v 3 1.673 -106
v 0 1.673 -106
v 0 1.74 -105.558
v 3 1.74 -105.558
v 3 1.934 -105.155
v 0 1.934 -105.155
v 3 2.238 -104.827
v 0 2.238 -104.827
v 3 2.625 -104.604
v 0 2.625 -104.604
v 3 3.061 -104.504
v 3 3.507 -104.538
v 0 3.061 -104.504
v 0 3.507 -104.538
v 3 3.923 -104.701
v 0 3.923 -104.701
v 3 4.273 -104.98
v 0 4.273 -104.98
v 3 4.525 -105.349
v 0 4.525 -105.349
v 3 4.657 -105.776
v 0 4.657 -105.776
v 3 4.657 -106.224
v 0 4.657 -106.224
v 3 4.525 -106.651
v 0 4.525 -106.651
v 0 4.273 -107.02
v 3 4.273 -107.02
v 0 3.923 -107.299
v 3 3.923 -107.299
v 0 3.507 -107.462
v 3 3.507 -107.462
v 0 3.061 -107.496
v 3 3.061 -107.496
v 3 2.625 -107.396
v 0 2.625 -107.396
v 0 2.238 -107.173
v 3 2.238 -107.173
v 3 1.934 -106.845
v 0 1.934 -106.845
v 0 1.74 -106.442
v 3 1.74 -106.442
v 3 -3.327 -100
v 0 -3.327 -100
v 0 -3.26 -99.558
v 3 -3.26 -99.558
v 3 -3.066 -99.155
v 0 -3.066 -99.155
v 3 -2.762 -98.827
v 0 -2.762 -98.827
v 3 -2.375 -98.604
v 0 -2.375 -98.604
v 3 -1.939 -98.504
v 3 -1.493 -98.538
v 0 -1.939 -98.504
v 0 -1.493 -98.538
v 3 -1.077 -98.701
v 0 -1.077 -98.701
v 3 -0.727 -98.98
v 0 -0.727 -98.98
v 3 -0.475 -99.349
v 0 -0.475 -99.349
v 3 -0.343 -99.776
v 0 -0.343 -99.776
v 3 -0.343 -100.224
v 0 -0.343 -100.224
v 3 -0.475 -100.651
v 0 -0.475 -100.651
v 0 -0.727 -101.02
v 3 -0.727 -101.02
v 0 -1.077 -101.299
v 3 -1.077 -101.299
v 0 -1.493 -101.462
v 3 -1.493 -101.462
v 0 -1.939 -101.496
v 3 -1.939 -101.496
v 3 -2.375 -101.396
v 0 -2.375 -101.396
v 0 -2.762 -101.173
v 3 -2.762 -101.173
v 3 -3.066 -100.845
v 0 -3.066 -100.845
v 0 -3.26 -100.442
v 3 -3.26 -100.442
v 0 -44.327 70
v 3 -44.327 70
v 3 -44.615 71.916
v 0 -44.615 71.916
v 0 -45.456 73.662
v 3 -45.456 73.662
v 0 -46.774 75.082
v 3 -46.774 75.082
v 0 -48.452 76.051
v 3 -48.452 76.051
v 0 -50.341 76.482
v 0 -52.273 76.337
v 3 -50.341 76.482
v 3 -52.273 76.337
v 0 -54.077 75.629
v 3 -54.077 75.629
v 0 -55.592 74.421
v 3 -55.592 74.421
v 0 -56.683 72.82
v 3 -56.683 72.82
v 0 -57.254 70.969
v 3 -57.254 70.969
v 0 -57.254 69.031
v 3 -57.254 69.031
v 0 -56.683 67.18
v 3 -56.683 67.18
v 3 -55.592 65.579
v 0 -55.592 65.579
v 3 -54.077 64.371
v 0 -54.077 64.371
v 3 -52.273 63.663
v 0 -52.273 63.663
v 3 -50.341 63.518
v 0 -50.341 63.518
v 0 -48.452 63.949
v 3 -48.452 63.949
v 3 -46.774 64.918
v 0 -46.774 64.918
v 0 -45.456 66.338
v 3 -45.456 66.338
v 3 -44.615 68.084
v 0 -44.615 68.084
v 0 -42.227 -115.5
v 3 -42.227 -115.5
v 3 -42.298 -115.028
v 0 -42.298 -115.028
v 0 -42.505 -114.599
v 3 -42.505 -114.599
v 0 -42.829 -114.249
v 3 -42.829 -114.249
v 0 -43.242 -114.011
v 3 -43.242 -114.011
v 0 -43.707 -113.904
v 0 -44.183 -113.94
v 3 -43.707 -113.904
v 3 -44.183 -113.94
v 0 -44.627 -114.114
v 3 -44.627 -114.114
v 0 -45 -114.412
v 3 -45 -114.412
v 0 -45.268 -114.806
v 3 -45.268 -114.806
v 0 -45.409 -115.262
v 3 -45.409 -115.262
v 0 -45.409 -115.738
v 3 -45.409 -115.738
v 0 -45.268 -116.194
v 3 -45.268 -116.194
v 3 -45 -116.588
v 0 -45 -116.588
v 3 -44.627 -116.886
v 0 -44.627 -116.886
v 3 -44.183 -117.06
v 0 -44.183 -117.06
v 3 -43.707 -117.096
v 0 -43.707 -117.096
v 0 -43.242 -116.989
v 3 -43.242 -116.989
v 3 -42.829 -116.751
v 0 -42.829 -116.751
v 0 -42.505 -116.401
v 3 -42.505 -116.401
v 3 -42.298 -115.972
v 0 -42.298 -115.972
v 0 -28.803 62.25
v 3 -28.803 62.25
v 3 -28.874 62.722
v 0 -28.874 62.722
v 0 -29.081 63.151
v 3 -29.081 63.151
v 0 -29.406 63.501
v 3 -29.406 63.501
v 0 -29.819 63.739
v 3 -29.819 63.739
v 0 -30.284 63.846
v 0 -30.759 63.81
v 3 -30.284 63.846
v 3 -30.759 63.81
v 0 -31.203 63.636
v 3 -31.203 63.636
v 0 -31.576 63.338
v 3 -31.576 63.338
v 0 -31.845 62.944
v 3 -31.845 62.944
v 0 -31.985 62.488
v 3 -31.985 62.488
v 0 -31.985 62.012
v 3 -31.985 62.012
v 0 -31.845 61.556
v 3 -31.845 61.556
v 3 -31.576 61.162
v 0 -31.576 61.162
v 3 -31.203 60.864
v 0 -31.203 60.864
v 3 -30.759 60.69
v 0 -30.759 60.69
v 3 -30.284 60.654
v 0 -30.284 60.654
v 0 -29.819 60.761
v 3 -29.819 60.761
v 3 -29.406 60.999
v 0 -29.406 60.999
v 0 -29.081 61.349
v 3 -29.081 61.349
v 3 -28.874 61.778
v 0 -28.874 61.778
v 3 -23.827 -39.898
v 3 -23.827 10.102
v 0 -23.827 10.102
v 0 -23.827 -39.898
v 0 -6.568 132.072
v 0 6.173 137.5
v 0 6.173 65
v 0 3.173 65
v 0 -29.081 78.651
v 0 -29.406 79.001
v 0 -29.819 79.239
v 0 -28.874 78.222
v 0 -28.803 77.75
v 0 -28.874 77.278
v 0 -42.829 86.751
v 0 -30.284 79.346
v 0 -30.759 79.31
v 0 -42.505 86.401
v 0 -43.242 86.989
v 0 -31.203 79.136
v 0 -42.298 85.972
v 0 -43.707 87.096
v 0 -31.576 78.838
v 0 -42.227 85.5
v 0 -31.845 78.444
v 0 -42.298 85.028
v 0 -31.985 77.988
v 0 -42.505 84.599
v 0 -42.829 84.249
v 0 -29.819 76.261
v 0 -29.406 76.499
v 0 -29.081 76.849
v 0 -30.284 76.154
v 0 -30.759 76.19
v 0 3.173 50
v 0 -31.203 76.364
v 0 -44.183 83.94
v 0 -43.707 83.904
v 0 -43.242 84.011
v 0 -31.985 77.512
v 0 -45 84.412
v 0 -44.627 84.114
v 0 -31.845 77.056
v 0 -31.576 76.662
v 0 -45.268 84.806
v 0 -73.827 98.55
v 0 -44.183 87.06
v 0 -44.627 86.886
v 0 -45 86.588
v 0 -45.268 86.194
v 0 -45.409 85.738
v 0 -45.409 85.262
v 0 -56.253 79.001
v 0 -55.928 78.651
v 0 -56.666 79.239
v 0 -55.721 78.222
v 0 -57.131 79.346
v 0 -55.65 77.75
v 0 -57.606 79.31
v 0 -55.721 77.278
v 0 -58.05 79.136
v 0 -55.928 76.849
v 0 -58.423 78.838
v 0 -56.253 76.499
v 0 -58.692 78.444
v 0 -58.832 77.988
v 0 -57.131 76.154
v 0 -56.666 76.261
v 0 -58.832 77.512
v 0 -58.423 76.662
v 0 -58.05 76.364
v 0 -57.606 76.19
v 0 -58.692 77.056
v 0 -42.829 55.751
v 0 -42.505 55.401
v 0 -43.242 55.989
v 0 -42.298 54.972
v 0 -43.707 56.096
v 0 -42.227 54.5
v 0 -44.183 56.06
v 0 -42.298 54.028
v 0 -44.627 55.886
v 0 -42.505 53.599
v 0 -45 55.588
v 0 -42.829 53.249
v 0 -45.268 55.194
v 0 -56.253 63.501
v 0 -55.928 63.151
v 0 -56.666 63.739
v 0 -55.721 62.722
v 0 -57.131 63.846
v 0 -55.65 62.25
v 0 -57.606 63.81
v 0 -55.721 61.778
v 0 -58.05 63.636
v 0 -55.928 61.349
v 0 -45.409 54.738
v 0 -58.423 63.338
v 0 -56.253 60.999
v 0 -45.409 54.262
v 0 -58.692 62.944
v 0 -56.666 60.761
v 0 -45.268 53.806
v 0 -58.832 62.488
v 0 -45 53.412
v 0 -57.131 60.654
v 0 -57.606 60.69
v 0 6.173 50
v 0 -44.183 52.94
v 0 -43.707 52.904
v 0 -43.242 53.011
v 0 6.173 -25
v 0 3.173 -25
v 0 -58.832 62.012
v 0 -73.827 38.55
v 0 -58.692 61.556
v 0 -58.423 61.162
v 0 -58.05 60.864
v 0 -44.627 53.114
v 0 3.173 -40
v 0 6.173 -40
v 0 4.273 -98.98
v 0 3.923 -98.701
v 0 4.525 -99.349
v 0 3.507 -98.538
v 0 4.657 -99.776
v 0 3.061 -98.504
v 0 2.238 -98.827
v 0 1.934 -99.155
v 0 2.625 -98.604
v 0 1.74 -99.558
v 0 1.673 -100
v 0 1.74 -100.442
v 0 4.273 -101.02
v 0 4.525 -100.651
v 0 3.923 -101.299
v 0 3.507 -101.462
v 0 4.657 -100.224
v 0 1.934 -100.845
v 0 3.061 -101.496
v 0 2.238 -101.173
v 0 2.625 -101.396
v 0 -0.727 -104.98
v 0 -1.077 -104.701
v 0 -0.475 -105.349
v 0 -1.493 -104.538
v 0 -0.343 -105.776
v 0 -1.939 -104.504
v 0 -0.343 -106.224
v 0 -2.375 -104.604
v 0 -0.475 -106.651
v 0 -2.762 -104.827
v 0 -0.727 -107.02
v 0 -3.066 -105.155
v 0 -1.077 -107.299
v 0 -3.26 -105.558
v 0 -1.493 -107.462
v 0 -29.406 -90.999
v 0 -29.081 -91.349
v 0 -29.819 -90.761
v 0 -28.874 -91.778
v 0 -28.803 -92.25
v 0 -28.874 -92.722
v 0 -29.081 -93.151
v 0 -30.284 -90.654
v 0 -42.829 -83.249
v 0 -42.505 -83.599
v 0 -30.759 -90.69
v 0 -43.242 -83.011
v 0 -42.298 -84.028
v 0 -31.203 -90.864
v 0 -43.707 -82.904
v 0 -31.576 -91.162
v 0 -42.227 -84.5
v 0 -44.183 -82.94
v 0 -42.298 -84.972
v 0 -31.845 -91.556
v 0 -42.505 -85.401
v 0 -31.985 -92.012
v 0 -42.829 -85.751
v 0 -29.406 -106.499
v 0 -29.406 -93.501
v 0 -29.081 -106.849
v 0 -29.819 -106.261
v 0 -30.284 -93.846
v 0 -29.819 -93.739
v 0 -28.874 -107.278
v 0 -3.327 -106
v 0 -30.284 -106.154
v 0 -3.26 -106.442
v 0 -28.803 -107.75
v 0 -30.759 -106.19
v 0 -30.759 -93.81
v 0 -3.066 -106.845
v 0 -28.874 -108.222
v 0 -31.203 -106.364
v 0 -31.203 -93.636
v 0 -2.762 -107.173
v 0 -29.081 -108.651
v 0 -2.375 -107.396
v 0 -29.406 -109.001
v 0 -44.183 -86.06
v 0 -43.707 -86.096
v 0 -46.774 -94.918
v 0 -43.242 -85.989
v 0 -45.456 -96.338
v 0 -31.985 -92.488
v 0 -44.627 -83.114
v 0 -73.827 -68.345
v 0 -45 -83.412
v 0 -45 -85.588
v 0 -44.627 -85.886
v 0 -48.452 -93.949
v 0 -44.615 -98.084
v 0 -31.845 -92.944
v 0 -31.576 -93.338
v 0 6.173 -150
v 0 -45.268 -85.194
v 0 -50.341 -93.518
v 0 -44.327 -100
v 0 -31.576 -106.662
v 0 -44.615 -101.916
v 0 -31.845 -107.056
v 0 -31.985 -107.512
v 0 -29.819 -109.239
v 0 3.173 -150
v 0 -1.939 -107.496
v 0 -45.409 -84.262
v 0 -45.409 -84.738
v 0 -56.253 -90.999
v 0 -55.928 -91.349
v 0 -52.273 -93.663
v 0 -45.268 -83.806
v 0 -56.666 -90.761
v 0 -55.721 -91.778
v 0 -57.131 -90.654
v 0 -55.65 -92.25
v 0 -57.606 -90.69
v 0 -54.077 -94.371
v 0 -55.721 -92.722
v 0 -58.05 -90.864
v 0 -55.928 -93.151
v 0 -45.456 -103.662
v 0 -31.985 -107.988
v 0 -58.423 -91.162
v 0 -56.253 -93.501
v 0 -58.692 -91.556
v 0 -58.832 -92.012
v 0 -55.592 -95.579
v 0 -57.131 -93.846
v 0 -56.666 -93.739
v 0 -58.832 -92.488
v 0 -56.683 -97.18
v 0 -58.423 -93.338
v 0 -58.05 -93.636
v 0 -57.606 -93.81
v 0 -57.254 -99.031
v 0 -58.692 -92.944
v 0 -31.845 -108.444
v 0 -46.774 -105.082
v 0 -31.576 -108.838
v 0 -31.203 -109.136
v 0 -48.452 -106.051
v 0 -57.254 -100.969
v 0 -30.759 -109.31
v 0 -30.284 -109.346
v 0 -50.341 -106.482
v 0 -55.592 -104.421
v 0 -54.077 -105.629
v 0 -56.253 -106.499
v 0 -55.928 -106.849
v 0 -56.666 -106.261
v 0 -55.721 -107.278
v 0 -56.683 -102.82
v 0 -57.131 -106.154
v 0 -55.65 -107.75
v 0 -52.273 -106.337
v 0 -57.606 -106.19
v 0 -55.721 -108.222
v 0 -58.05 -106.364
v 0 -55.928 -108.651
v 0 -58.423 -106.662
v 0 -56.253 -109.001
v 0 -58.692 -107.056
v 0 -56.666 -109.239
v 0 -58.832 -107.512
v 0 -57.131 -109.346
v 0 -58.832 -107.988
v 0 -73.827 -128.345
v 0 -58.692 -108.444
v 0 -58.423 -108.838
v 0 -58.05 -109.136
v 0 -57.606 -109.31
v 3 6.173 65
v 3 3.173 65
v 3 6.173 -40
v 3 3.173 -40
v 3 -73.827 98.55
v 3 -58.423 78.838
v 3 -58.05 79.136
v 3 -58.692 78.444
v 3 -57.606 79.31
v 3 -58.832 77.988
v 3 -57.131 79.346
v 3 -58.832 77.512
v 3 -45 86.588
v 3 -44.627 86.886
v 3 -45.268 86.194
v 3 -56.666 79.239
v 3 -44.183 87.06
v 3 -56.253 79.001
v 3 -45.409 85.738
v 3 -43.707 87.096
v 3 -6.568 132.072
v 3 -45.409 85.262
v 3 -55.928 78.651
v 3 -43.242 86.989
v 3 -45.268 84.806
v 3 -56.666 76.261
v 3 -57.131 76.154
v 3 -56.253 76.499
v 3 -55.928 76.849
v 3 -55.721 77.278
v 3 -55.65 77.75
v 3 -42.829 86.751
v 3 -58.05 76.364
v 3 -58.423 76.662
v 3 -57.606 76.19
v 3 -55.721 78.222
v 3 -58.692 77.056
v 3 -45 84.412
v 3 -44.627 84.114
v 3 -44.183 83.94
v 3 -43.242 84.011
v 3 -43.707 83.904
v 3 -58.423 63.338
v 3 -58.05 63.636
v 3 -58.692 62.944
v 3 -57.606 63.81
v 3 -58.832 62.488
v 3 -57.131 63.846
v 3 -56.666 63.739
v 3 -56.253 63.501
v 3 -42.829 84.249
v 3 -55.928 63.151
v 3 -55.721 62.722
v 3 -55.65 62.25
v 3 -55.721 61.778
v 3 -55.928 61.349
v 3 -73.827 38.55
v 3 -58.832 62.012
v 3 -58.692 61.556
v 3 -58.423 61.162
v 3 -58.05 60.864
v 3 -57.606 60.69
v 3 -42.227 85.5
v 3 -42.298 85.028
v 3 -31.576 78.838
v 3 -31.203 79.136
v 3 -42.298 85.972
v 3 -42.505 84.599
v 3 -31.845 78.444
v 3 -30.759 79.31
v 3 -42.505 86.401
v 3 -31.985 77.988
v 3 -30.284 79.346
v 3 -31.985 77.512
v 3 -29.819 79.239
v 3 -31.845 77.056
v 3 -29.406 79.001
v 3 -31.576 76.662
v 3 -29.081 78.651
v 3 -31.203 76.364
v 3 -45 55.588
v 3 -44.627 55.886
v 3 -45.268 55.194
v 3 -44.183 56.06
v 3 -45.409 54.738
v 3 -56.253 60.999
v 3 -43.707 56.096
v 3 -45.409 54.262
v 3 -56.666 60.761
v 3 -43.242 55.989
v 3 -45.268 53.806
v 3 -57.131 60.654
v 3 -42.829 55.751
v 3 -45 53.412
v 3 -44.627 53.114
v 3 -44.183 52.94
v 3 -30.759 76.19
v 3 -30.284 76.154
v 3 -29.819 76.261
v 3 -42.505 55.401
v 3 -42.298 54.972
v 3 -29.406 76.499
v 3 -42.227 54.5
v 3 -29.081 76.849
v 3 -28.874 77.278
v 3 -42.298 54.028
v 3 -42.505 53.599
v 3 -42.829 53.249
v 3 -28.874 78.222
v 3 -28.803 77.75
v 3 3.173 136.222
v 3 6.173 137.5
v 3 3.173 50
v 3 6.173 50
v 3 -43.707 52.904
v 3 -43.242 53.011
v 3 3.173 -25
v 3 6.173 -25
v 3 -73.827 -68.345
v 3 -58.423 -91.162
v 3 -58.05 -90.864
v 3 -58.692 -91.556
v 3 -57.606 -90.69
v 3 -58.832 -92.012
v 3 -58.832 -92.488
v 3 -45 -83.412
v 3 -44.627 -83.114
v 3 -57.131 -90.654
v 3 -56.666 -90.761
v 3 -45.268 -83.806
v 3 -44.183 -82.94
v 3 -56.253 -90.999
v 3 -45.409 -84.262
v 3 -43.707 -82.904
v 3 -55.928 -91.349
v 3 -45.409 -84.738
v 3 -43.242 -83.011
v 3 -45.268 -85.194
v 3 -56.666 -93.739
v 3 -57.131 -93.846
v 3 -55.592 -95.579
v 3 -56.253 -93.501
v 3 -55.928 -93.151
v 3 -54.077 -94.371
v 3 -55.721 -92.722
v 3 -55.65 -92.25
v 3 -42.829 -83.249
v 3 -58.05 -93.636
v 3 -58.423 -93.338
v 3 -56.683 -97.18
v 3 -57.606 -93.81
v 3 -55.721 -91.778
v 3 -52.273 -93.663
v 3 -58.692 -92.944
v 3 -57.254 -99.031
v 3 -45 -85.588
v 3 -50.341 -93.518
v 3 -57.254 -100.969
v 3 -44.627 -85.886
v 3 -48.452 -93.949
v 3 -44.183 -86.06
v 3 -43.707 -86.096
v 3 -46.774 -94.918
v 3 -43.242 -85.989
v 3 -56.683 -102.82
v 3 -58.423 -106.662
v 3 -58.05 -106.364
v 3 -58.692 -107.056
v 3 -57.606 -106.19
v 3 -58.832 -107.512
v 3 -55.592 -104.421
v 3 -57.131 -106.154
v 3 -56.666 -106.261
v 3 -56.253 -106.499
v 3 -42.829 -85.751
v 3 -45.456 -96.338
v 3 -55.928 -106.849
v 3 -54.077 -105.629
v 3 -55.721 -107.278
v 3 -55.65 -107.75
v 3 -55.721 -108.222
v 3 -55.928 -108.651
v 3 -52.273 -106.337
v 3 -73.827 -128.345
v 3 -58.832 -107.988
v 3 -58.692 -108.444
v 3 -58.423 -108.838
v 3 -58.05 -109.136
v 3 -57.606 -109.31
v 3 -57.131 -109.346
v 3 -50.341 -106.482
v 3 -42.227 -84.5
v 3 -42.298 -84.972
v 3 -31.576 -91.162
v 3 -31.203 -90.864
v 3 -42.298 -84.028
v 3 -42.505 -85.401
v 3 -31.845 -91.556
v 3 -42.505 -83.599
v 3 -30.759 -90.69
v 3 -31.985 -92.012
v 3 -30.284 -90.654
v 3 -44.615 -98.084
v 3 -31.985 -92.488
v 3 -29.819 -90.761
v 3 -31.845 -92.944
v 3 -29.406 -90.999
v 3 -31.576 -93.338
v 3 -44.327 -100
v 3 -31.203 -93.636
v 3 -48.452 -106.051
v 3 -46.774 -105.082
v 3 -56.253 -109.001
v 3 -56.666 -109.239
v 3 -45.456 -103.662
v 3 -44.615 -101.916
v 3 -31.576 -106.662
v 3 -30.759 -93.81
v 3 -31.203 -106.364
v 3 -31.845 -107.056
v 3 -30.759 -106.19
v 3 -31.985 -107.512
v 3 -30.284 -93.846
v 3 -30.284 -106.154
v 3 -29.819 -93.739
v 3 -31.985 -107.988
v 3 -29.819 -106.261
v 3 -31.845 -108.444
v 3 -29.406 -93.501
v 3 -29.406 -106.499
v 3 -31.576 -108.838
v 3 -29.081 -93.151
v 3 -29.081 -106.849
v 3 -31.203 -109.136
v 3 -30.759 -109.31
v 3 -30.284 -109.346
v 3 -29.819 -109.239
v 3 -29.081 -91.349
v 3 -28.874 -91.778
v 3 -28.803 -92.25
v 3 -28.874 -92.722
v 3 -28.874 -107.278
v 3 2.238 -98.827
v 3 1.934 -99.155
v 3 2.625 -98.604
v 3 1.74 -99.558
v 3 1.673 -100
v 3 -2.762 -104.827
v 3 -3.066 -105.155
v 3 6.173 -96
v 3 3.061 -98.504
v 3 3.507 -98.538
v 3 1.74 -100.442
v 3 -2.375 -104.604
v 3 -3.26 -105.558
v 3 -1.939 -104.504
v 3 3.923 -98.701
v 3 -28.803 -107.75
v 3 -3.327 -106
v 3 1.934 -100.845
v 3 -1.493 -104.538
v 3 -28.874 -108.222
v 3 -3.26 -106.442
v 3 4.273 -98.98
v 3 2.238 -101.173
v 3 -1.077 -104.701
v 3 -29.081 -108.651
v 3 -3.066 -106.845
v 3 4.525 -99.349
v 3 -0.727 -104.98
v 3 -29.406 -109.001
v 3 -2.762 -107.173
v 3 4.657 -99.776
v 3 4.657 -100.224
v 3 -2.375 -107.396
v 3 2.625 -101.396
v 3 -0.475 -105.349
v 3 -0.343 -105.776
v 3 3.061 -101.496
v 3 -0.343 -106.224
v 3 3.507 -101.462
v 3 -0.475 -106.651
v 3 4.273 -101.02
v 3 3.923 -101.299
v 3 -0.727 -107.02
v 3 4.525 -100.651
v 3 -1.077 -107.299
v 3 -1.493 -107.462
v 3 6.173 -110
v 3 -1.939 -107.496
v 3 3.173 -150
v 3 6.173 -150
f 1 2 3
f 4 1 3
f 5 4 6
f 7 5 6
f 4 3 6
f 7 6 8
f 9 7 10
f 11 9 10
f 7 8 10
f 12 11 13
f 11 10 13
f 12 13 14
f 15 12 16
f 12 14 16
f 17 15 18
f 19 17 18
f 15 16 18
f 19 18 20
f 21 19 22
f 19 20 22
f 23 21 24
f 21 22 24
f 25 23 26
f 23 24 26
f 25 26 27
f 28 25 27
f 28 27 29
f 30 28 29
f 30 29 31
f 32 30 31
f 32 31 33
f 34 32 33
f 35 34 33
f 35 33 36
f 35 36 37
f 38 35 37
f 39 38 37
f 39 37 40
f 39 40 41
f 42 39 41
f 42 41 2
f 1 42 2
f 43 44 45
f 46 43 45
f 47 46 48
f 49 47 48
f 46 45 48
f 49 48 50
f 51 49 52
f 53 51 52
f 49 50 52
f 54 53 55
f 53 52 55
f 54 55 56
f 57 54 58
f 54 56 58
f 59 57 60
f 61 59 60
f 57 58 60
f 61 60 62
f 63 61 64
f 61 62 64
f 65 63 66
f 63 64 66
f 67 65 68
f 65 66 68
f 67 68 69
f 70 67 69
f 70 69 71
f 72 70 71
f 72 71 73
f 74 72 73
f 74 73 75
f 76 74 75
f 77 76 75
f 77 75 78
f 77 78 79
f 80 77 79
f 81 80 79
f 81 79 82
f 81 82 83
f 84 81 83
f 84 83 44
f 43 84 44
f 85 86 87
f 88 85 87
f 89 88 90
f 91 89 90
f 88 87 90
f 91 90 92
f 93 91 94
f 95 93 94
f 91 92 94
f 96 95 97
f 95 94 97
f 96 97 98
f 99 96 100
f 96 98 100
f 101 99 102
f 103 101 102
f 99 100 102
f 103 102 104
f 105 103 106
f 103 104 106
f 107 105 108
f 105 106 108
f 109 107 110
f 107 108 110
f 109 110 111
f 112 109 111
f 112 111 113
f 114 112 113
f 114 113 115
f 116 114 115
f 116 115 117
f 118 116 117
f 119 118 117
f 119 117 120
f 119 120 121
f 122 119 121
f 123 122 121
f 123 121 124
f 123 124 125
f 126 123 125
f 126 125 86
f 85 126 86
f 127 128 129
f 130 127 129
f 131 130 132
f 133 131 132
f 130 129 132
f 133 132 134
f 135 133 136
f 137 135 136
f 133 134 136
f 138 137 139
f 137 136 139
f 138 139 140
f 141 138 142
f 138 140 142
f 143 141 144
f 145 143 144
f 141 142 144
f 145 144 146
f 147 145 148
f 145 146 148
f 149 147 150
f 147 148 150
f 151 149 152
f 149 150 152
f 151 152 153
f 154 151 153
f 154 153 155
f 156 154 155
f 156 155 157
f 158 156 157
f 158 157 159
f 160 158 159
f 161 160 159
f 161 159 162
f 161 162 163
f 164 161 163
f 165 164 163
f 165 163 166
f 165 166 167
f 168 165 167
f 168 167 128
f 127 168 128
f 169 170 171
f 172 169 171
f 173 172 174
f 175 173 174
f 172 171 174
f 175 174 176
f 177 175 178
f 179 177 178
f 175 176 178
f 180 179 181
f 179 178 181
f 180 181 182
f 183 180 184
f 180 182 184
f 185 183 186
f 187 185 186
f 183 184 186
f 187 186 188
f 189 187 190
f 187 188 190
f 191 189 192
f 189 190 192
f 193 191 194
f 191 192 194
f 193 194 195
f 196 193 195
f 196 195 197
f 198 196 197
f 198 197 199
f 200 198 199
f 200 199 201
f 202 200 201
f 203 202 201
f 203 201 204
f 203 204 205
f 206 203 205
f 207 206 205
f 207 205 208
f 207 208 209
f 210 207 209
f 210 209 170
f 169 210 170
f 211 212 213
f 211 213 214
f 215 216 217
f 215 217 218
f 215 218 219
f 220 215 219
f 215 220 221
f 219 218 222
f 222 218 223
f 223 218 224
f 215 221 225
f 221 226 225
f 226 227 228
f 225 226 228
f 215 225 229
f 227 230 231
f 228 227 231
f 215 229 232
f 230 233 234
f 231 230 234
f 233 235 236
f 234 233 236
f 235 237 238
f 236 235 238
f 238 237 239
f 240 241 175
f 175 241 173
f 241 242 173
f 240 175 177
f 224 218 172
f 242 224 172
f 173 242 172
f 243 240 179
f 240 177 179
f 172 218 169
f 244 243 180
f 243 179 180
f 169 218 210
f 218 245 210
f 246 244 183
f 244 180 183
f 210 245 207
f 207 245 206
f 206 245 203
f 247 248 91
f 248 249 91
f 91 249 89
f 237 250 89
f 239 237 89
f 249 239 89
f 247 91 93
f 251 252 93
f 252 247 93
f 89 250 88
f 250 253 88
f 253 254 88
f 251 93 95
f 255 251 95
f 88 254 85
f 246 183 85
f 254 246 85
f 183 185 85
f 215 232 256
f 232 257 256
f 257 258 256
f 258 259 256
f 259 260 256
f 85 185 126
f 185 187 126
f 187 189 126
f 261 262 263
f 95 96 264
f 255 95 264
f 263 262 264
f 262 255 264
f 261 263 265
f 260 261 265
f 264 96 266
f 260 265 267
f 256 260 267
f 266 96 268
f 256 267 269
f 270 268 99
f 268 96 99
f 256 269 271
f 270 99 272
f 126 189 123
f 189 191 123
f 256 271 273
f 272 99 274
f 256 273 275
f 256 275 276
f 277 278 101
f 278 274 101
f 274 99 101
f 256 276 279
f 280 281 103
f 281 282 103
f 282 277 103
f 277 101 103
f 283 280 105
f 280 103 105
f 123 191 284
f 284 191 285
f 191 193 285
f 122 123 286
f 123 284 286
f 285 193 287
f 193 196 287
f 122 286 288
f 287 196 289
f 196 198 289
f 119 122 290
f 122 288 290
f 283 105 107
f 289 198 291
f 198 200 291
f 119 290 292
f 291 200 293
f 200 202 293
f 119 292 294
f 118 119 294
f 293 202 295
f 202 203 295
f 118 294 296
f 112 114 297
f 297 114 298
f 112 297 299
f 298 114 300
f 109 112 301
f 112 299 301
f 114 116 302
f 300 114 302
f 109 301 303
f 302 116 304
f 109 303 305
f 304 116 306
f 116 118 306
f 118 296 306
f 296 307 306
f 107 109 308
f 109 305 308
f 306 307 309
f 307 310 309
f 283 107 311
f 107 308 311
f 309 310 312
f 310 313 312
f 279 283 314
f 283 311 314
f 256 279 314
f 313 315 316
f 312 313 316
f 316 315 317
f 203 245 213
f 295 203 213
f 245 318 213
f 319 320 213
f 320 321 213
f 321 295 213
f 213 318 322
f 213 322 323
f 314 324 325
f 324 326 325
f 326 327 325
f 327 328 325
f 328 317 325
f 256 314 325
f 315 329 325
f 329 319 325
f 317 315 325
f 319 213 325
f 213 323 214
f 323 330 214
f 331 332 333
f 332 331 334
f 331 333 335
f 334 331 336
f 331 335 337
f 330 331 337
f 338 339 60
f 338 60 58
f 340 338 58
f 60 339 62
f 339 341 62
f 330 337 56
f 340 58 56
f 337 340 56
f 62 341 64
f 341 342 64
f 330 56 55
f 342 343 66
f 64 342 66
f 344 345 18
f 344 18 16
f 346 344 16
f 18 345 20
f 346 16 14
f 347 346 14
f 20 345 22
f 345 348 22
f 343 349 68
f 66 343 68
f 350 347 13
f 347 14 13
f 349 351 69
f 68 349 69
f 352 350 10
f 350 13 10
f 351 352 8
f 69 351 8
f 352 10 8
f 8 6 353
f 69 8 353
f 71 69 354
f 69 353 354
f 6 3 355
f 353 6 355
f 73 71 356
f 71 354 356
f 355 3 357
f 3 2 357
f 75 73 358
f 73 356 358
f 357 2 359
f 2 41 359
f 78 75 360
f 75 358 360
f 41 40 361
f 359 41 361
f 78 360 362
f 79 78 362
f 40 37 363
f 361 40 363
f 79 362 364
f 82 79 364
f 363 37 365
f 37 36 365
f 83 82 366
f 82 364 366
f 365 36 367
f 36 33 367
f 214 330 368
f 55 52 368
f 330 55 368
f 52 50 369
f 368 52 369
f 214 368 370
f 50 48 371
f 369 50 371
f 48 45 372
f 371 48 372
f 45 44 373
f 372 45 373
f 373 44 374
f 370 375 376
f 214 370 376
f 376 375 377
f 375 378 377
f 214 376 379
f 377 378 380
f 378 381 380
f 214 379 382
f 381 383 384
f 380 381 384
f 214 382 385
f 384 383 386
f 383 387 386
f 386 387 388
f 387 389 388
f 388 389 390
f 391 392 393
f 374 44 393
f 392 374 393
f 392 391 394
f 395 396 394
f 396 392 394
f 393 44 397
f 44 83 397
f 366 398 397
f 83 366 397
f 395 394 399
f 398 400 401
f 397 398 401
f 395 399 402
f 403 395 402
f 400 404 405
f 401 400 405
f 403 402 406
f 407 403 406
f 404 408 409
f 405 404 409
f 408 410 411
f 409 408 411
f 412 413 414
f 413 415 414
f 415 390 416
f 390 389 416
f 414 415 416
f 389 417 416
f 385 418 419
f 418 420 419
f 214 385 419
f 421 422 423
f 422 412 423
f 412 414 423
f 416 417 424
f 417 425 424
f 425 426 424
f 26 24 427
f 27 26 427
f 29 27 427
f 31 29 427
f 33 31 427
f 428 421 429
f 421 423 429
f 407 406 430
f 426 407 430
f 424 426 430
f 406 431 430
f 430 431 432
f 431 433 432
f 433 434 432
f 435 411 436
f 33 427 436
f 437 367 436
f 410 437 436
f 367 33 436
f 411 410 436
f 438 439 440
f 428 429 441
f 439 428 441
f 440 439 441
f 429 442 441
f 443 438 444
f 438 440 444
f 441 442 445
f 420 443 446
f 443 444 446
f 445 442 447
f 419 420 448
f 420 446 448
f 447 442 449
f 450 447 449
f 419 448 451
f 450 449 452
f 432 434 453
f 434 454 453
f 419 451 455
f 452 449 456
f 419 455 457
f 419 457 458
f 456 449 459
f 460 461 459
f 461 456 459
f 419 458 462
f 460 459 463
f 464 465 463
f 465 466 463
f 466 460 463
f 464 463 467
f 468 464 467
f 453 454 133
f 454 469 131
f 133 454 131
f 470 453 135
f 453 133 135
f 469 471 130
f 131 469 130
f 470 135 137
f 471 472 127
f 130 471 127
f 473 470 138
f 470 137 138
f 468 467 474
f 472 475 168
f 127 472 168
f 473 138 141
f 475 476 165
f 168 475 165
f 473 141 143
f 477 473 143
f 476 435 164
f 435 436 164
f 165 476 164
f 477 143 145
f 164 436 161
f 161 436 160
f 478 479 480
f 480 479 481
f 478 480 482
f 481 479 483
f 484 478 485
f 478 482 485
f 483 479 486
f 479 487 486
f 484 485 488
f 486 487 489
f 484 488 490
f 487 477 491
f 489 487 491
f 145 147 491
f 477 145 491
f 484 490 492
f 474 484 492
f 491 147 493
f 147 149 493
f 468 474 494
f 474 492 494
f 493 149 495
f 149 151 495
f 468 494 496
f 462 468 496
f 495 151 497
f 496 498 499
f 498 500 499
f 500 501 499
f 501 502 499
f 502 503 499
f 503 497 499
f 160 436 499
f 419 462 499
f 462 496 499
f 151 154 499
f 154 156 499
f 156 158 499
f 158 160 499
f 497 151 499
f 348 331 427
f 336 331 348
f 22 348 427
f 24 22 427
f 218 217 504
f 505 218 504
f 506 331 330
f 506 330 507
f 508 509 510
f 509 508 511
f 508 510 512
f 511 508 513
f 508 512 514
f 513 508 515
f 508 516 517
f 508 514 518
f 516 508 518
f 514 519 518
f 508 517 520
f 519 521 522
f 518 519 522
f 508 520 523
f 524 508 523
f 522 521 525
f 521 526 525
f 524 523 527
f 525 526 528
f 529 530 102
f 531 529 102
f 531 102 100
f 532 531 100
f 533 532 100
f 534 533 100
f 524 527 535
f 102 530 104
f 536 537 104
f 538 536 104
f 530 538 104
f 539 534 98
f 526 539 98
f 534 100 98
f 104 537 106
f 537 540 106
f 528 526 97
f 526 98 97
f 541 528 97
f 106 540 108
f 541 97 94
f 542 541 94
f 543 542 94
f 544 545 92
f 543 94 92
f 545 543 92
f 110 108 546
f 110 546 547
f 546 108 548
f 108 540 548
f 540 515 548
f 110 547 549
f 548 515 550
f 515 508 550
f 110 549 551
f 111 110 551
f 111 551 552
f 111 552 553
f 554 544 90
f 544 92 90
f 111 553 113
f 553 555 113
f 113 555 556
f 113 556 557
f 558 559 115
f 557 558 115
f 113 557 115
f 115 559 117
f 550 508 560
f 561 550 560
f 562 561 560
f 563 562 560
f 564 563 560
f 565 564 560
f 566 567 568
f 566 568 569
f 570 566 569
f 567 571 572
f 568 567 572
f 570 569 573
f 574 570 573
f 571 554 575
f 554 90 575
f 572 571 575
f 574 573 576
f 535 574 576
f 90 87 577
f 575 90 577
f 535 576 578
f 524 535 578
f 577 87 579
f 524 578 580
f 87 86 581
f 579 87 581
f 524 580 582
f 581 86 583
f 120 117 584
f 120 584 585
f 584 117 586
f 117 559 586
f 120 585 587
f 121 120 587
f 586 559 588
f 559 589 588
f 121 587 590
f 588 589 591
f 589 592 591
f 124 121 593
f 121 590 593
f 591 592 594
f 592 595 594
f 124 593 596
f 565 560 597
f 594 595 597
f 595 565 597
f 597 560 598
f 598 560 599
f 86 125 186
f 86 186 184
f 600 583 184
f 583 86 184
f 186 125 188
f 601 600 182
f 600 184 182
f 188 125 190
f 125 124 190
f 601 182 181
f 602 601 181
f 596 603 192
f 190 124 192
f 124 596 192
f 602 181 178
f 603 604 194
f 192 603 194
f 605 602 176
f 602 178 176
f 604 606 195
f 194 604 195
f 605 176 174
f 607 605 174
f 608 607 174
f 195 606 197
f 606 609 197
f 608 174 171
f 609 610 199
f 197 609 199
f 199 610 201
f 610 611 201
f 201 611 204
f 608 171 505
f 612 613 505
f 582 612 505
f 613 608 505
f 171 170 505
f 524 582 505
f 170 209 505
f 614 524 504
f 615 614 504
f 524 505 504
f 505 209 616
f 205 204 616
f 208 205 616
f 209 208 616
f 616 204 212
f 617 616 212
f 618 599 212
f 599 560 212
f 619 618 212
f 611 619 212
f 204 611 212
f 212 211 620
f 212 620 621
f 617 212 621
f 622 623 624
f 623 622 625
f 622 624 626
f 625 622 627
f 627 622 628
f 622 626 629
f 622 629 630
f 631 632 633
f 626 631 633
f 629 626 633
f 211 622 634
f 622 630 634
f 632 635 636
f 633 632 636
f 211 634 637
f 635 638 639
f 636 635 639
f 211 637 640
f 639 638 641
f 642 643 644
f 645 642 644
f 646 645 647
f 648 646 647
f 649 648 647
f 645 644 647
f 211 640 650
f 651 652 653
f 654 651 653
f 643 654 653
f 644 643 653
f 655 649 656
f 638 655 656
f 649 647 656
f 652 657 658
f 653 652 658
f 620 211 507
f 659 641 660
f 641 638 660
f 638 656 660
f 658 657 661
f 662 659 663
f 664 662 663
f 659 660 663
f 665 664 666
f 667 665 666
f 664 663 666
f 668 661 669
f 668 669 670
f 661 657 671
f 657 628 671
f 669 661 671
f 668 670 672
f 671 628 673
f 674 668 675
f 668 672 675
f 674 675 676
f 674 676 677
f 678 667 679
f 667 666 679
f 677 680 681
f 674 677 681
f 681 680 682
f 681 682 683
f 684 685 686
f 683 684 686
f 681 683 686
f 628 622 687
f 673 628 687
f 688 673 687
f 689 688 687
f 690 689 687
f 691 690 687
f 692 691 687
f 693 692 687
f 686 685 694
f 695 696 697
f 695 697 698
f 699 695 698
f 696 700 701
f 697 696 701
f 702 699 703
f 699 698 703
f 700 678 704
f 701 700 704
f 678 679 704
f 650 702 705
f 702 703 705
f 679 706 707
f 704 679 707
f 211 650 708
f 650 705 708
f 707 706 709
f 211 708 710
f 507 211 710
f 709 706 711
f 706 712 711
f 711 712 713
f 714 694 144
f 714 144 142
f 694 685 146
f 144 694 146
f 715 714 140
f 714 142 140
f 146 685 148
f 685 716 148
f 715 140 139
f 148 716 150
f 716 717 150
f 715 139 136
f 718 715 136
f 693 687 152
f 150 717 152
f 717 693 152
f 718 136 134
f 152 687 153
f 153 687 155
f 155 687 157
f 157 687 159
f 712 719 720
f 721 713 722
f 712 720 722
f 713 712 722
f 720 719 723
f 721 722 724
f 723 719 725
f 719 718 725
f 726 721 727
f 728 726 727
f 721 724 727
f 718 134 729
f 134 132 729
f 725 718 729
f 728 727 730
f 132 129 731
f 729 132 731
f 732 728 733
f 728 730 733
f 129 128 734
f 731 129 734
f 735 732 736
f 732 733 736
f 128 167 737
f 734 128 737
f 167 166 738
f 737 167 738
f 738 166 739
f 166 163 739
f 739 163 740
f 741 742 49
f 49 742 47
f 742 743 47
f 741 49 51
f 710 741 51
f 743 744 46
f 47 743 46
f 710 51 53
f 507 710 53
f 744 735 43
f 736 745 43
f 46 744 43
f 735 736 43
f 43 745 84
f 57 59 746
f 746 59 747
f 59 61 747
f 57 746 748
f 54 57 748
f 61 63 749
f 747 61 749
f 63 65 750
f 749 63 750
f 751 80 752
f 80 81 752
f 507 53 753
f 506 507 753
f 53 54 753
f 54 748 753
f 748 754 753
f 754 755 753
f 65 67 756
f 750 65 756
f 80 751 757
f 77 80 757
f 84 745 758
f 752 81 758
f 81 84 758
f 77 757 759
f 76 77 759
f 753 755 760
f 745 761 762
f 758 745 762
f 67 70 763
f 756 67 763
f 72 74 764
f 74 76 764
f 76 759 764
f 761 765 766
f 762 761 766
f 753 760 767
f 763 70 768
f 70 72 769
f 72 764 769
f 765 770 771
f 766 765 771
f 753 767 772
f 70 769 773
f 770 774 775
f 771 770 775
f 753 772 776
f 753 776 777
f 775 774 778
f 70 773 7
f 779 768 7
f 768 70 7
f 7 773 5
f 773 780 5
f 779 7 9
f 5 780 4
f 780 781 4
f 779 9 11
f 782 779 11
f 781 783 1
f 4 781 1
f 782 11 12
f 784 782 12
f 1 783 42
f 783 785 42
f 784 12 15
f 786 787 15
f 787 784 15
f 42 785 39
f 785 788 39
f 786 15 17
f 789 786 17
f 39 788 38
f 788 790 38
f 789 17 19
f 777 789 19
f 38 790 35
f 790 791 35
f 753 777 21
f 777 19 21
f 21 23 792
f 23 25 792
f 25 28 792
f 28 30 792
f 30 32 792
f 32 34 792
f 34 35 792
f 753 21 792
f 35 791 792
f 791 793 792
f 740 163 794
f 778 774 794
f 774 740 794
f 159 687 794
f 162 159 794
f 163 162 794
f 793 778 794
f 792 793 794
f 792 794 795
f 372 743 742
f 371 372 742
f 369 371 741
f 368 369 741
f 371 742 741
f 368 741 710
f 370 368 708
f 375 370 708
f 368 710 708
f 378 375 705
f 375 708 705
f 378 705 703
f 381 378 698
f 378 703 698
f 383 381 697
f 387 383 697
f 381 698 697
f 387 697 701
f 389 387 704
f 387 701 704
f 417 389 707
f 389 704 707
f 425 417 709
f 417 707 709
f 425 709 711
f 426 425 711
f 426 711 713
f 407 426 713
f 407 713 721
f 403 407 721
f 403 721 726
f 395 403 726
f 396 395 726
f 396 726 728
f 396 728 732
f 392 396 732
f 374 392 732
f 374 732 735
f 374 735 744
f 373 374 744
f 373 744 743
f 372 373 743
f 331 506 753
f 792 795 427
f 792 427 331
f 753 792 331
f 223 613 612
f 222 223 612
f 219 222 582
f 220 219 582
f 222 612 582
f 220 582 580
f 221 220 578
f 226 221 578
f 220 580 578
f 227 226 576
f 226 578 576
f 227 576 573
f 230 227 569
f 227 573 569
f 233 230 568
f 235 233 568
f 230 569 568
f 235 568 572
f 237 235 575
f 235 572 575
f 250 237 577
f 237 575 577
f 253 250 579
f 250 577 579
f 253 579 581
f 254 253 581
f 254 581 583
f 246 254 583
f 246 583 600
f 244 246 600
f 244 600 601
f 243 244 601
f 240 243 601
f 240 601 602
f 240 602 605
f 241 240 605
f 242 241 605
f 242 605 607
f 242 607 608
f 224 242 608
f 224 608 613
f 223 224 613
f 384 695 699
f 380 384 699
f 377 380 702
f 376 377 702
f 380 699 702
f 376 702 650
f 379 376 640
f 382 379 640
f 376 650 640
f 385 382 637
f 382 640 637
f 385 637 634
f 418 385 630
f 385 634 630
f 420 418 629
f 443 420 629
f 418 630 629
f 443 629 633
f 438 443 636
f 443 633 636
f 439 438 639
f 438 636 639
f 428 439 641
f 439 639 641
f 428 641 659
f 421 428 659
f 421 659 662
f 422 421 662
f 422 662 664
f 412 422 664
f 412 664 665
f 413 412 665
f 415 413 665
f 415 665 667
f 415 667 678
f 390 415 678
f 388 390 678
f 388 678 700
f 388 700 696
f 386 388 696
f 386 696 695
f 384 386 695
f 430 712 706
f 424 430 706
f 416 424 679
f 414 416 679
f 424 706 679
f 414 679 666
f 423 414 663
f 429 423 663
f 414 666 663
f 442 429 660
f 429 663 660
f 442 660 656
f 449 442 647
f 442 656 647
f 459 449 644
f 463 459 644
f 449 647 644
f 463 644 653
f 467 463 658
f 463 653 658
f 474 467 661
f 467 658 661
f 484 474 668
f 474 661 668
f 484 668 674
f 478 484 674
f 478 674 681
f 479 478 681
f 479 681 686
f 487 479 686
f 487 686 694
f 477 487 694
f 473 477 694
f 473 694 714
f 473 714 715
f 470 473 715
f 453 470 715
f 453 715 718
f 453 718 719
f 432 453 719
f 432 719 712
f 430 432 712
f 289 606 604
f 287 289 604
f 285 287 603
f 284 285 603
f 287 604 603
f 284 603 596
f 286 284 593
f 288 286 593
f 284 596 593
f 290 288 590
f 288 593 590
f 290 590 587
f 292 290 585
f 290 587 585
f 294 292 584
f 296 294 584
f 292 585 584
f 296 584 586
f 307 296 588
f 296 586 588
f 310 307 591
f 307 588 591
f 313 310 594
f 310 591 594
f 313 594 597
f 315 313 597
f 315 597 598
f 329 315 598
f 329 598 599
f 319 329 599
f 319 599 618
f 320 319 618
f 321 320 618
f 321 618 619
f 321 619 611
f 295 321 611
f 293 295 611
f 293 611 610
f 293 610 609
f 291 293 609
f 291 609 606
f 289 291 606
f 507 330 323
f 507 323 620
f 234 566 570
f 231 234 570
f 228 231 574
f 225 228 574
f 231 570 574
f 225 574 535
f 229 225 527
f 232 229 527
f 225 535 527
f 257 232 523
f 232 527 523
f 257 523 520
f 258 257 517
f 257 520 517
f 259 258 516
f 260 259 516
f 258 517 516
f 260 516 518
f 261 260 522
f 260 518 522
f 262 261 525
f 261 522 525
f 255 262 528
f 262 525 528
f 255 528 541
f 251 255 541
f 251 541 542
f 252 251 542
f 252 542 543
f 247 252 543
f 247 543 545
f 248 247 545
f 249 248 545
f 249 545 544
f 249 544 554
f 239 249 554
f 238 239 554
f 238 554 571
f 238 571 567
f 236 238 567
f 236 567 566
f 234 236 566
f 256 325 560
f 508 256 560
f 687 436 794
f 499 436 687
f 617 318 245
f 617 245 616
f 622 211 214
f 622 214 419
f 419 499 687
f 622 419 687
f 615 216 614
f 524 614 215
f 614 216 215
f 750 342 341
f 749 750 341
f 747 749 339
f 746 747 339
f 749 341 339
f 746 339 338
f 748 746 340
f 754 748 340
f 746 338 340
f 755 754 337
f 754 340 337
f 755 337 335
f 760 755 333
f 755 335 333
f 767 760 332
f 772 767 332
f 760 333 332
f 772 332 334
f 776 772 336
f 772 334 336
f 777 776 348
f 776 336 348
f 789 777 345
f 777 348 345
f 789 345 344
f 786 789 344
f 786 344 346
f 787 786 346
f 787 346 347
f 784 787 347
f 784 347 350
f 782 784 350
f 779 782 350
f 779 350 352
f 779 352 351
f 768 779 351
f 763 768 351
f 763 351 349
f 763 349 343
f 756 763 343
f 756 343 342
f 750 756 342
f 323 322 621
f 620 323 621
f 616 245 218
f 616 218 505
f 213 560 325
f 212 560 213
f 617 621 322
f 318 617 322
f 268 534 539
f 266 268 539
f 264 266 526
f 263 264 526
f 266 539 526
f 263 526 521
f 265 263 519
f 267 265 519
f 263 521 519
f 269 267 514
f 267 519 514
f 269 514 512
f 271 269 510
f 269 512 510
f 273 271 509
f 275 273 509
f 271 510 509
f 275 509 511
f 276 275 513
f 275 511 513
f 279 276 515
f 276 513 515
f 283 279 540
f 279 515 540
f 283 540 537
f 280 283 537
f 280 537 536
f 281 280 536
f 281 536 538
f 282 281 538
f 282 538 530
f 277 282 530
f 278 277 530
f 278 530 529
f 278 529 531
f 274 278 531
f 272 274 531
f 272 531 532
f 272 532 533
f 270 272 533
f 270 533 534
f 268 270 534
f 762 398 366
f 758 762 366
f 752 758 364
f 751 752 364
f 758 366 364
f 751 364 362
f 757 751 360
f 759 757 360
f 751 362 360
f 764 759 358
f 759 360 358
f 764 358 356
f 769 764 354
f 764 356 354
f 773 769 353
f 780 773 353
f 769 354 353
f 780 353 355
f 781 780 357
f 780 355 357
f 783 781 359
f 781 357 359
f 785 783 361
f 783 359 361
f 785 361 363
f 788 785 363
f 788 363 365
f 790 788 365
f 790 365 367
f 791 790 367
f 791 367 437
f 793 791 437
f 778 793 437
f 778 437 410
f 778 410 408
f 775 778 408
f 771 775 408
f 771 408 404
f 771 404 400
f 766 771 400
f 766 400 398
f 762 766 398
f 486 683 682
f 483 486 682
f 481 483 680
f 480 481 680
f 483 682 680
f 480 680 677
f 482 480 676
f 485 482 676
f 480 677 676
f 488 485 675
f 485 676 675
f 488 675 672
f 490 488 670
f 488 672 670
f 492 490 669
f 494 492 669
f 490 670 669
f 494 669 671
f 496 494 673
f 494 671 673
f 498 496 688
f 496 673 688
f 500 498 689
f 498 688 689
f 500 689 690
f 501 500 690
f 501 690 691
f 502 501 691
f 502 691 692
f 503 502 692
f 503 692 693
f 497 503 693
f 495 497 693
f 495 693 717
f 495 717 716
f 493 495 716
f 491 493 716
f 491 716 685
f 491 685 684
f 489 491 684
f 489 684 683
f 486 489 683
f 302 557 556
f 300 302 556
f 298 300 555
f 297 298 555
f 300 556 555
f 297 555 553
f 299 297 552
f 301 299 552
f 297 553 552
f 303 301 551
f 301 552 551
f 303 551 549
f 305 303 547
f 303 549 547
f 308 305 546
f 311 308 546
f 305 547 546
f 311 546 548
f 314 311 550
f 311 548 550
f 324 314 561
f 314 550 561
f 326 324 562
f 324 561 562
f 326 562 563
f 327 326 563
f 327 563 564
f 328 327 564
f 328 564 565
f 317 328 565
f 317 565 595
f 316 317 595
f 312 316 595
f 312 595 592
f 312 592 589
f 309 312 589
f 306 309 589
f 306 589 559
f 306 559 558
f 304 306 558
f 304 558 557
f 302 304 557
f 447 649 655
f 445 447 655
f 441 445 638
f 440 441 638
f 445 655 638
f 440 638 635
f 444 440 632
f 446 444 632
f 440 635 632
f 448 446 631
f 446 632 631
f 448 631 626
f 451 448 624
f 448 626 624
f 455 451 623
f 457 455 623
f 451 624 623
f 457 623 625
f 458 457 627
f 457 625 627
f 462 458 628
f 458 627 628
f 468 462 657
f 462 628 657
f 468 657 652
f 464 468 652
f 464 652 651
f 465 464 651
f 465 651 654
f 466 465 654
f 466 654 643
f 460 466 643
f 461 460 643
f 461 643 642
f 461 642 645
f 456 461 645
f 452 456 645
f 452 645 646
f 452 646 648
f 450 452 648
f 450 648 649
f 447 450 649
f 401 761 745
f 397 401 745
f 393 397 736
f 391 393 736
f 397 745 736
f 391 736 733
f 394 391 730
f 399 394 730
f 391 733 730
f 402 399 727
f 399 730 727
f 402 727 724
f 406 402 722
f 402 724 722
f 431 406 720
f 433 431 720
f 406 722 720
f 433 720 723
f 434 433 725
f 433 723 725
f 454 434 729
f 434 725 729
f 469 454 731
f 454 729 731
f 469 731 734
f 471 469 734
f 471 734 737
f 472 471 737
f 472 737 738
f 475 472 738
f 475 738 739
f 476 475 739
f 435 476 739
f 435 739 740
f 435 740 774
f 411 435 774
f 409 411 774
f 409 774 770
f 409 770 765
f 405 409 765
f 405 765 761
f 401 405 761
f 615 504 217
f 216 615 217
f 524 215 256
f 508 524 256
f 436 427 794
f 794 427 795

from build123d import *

# Parameters (mm, degrees)
EXTRUDE_1_DEPTH           = 150
EXTRUDE_1_DEPTH_BACK      = 150
SKETCH_4_R                = 2.5
CUT_EXTRUDE_4_DEPTH       = 3
SKETCH_5_W                = 52
SKETCH_5_H                = 100
CUT_EXTRUDE_5_DEPTH       = 3
SKETCH_7_R                = 1.6
SKETCH_7_R_2              = 6.5
CUT_EXTRUDE_9_DEPTH       = 185.063533313
SKETCH_6_W                = 40
SKETCH_6_H                = 200
CUT_EXTRUDE_10_DEPTH      = 10
CUT_EXTRUDE_12_DEPTH      = 4
SKETCH_12_W               = 34
SKETCH_12_H               = 110
CUT_EXTRUDE_13_DEPTH      = 4
SKETCH_14_W               = 4.2
SKETCH_14_H               = 14
CUT_EXTRUDE_14_DEPTH      = 10
SKETCH_15_R               = 2
CUT_EXTRUDE_15_DEPTH      = 26
SKETCH_17_R               = 1.5
CUT_EXTRUDE_19_DEPTH      = 10
CUT_EXTRUDE_20_DEPTH      = 10
CUT_EXTRUDE_21_DEPTH      = 31
SKETCH_22_R               = 1.5
CUT_EXTRUDE_22_DEPTH      = 31
SKETCH_23_W               = 12
SKETCH_23_H               = 87.5
EXTRUDE_3_DEPTH           = 3
CUT_EXTRUDE_23_DEPTH      = 18
CUT_EXTRUDE_24_DEPTH      = 13
CUT_EXTRUDE_24_DEPTH_BACK = 4
SKETCH_25_R               = 1.5
SKETCH_26_R               = 2
CUT_EXTRUDE_25_DEPTH      = 10
SKETCH_27_R               = 1.5
CUT_EXTRUDE_26_DEPTH      = 10
CUT_EXTRUDE_29_DEPTH      = 10
SKETCH_32_W               = 44.628479445
SKETCH_32_H               = 8.012675998
CUT_EXTRUDE_30_DEPTH      = 345
SKETCH_33_W               = 3
SKETCH_33_H               = 15
CUT_EXTRUDE_31_DEPTH      = 3


with BuildPart() as part:
    # 草图1 → 凸台-拉伸1 (new, two sides: drawn at the far end of the back side and taken through both)
    with BuildSketch(Plane.XY.offset(-EXTRUDE_1_DEPTH_BACK)):
        Polygon((0, 4.173281966), (0, -73.826718034), (3, -73.826718034), (3, 1.173281966), (3, 3.173281966), (5, 3.173281966), (80, 3.173281966), (80, 6.173281966), (2, 6.173281966), (0, 6.173281966), align=None)
    extrude(amount=EXTRUDE_1_DEPTH + EXTRUDE_1_DEPTH_BACK)

    # 草图4 → 切除-拉伸4 (cut)
    with BuildSketch(Plane(origin=(0, 6.173281966, 0), x_dir=(1, 0, 0), z_dir=(0, 1, 0))):
        with Locations((11.5, -72.5)):
            Circle(SKETCH_4_R)
        with Locations((11.5, -127.5)):
            Circle(SKETCH_4_R)
    extrude(amount=-CUT_EXTRUDE_4_DEPTH, mode=Mode.SUBTRACT)

    # 草图5 → 切除-拉伸5 (cut)
    with BuildSketch(Plane(origin=(0, 6.173281966, 0), x_dir=(1, 0, 0), z_dir=(0, 1, 0))):
        with Locations((54, -100)):
            Rectangle(SKETCH_5_W, SKETCH_5_H)
    extrude(amount=-CUT_EXTRUDE_5_DEPTH, mode=Mode.SUBTRACT)

    # 草图7 → 切除-拉伸9 (cut, through all)
    with BuildSketch(Plane(origin=(3, 0, 0), x_dir=(0, 0, -1), z_dir=(1, 0, 0))):
        with Locations((84.5, -43.826718034)):
            Circle(SKETCH_7_R)
        with Locations((92.25, -57.250111793)):
            Circle(SKETCH_7_R)
        with Locations((107.75, -57.250111793)):
            Circle(SKETCH_7_R)
        with Locations((115.5, -43.826718034)):
            Circle(SKETCH_7_R)
        with Locations((107.75, -30.403324275)):
            Circle(SKETCH_7_R)
        with Locations((92.25, -30.403324275)):
            Circle(SKETCH_7_R)
        with Locations((-54.5, -43.826718034)):
            Circle(SKETCH_7_R)
        with Locations((-62.25, -57.250111793)):
            Circle(SKETCH_7_R)
        with Locations((-77.75, -57.250111793)):
            Circle(SKETCH_7_R)
        with Locations((-85.5, -43.826718034)):
            Circle(SKETCH_7_R)
        with Locations((-77.75, -30.403324275)):
            Circle(SKETCH_7_R)
        with Locations((-62.25, -30.403324275)):
            Circle(SKETCH_7_R)
        with Locations((-70, -50.826718034)):
            Circle(SKETCH_7_R_2)
        with Locations((100, -50.826718034)):
            Circle(SKETCH_7_R_2)
    extrude(amount=-CUT_EXTRUDE_9_DEPTH, mode=Mode.SUBTRACT)

    # 草图6 → 切除-拉伸10 (cut)
    with BuildSketch(Plane(origin=(0, 6.173281966, 0), x_dir=(1, 0, 0), z_dir=(0, 1, 0))):
        with Locations((60, 50)):
            Rectangle(SKETCH_6_W, SKETCH_6_H)
    extrude(amount=-CUT_EXTRUDE_10_DEPTH, mode=Mode.SUBTRACT)

    # 草图11 → 切除-拉伸12 (cut)
    with BuildSketch(Plane.ZY):
        Polygon((-128.345117246, -73.826718034), (-150, -73.826718034), (-150, 3.173281966), align=None)
    extrude(amount=-CUT_EXTRUDE_12_DEPTH, mode=Mode.SUBTRACT)

    # 草图12 → 切除-拉伸13 (cut)
    with BuildSketch(Plane(origin=(0, 6.173281966, 0), x_dir=(1, 0, 0), z_dir=(0, 1, 0))):
        with Locations((23, 95)):
            Rectangle(SKETCH_12_W, SKETCH_12_H)
    extrude(amount=-CUT_EXTRUDE_13_DEPTH, mode=Mode.SUBTRACT)

    # 草图14 → 切除-拉伸14 (cut)
    with BuildSketch(Plane.XZ.offset(-3.173281966)):
        with Locations((5.1, -103)):
            Rectangle(SKETCH_14_W, SKETCH_14_H)
    extrude(amount=-CUT_EXTRUDE_14_DEPTH, mode=Mode.SUBTRACT)

    # 草图15 → 切除-拉伸15 (cut)
    with BuildSketch(Plane(origin=(0, 6.173281966, 0), x_dir=(1, 0, 0), z_dir=(0, 1, 0))):
        with Locations((32, -4.5)):
            Circle(SKETCH_15_R)
    extrude(amount=-CUT_EXTRUDE_15_DEPTH, mode=Mode.SUBTRACT)

    # 草图17 → 切除-拉伸19 (cut)
    with BuildSketch(Plane.XZ.offset(-3.173281966)):
        with Locations((23.690733746, 113.5)):
            Circle(SKETCH_17_R)
    extrude(amount=-CUT_EXTRUDE_19_DEPTH, mode=Mode.SUBTRACT)

    # 草图18 → 切除-拉伸20 (cut)
    with BuildSketch(Plane.ZY):
        Polygon((150, -73.826718034), (118.550084008, -73.826718034), (150, 0), align=None)
    extrude(amount=-CUT_EXTRUDE_20_DEPTH, mode=Mode.SUBTRACT)

    # 草图21 → 切除-拉伸21 (cut)
    with BuildSketch(Plane.ZY):
        Polygon((118.550084008, -73.826718034), (150, 0), (150, 6.173281966), (137.5, 6.173281966), (132.072189672, -6.568164552), (98.550084008, -73.826718034), align=None)
    extrude(amount=-CUT_EXTRUDE_21_DEPTH, mode=Mode.SUBTRACT)

    # 草图22 → 切除-拉伸22 (cut)
    with BuildSketch(Plane.ZY):
        with Locations((-106, 3.173281966)):
            Circle(SKETCH_22_R)
        with Locations((-100, 3.173281966)):
            Circle(SKETCH_22_R)
        with Locations((-106, -1.826718034)):
            Circle(SKETCH_22_R)
        with Locations((-100, -1.826718034)):
            Circle(SKETCH_22_R)
    extrude(amount=-CUT_EXTRUDE_22_DEPTH, mode=Mode.SUBTRACT)

    # 草图23 → 凸台-拉伸3 (add)
    with BuildSketch(Plane(origin=(0, 6.173281966, 0), x_dir=(1, 0, 0), z_dir=(0, 1, 0))):
        with Locations((34, -93.75)):
            Rectangle(SKETCH_23_W, SKETCH_23_H)
    extrude(amount=-EXTRUDE_3_DEPTH)

    # 草图24 → 切除-拉伸23 (cut)
    with BuildSketch(Plane.ZY.offset(-28)):
        Polygon((137.5, 6.173281966), (137.5, 3.173281966), (136.222010805, 3.173281966), align=None)
    extrude(amount=-CUT_EXTRUDE_23_DEPTH, mode=Mode.SUBTRACT)

    # 草图25 → 切除-拉伸24 (cut, two sides: drawn at the far end of the back side and taken through both)
    with BuildSketch(Plane(origin=(0, 6.173281966, 0), x_dir=(1, 0, 0), z_dir=(0, 1, 0)).offset(-CUT_EXTRUDE_24_DEPTH_BACK)):
        with Locations((32, -61)):
            Circle(SKETCH_25_R)
    extrude(amount=CUT_EXTRUDE_24_DEPTH + CUT_EXTRUDE_24_DEPTH_BACK, mode=Mode.SUBTRACT)

    # 草图26 → 切除-拉伸25 (cut)
    with BuildSketch(Plane.XZ.offset(-3.173281966)):
        with Locations((32, -25.5)):
            Circle(SKETCH_26_R)
    extrude(amount=-CUT_EXTRUDE_25_DEPTH, mode=Mode.SUBTRACT)

    # 草图27 → 切除-拉伸26 (cut)
    with BuildSketch(Plane.XZ.offset(-3.173281966)):
        with Locations((23.690733746, 123.5)):
            Circle(SKETCH_27_R)
    extrude(amount=-CUT_EXTRUDE_26_DEPTH, mode=Mode.SUBTRACT)

    # 草图31 → 切除-拉伸29 (cut)
    with BuildSketch(Plane(origin=(3, 0, 0), x_dir=(0, 0, -1), z_dir=(1, 0, 0))):
        Polygon((-38.550084008, -73.826718034), (-10.102483381, -23.826718034), (39.897516619, -23.826718034), (68.345117246, -73.826718034), align=None)
    extrude(amount=-CUT_EXTRUDE_29_DEPTH, mode=Mode.SUBTRACT)

    # 草图32 → 切除-拉伸30 (cut)
    with BuildSketch(Plane(origin=(0, 0, -150), x_dir=(-1, 0, 0), z_dir=(0, 0, -1))):
        with Locations((-25.314239723, 7.179619965)):
            Rectangle(SKETCH_32_W, SKETCH_32_H)
    extrude(amount=-CUT_EXTRUDE_30_DEPTH, mode=Mode.SUBTRACT)

    # 草图33 → 切除-拉伸31 (cut)
    with BuildSketch(Plane(origin=(0, 6.173281966, 0), x_dir=(1, 0, 0), z_dir=(0, 1, 0))):
        with Locations((1.5, 32.5)):
            Rectangle(SKETCH_33_W, SKETCH_33_H)
        with Locations((1.5, -57.5)):
            Rectangle(SKETCH_33_W, SKETCH_33_H)
    extrude(amount=-CUT_EXTRUDE_31_DEPTH, mode=Mode.SUBTRACT)


solid = part.part
